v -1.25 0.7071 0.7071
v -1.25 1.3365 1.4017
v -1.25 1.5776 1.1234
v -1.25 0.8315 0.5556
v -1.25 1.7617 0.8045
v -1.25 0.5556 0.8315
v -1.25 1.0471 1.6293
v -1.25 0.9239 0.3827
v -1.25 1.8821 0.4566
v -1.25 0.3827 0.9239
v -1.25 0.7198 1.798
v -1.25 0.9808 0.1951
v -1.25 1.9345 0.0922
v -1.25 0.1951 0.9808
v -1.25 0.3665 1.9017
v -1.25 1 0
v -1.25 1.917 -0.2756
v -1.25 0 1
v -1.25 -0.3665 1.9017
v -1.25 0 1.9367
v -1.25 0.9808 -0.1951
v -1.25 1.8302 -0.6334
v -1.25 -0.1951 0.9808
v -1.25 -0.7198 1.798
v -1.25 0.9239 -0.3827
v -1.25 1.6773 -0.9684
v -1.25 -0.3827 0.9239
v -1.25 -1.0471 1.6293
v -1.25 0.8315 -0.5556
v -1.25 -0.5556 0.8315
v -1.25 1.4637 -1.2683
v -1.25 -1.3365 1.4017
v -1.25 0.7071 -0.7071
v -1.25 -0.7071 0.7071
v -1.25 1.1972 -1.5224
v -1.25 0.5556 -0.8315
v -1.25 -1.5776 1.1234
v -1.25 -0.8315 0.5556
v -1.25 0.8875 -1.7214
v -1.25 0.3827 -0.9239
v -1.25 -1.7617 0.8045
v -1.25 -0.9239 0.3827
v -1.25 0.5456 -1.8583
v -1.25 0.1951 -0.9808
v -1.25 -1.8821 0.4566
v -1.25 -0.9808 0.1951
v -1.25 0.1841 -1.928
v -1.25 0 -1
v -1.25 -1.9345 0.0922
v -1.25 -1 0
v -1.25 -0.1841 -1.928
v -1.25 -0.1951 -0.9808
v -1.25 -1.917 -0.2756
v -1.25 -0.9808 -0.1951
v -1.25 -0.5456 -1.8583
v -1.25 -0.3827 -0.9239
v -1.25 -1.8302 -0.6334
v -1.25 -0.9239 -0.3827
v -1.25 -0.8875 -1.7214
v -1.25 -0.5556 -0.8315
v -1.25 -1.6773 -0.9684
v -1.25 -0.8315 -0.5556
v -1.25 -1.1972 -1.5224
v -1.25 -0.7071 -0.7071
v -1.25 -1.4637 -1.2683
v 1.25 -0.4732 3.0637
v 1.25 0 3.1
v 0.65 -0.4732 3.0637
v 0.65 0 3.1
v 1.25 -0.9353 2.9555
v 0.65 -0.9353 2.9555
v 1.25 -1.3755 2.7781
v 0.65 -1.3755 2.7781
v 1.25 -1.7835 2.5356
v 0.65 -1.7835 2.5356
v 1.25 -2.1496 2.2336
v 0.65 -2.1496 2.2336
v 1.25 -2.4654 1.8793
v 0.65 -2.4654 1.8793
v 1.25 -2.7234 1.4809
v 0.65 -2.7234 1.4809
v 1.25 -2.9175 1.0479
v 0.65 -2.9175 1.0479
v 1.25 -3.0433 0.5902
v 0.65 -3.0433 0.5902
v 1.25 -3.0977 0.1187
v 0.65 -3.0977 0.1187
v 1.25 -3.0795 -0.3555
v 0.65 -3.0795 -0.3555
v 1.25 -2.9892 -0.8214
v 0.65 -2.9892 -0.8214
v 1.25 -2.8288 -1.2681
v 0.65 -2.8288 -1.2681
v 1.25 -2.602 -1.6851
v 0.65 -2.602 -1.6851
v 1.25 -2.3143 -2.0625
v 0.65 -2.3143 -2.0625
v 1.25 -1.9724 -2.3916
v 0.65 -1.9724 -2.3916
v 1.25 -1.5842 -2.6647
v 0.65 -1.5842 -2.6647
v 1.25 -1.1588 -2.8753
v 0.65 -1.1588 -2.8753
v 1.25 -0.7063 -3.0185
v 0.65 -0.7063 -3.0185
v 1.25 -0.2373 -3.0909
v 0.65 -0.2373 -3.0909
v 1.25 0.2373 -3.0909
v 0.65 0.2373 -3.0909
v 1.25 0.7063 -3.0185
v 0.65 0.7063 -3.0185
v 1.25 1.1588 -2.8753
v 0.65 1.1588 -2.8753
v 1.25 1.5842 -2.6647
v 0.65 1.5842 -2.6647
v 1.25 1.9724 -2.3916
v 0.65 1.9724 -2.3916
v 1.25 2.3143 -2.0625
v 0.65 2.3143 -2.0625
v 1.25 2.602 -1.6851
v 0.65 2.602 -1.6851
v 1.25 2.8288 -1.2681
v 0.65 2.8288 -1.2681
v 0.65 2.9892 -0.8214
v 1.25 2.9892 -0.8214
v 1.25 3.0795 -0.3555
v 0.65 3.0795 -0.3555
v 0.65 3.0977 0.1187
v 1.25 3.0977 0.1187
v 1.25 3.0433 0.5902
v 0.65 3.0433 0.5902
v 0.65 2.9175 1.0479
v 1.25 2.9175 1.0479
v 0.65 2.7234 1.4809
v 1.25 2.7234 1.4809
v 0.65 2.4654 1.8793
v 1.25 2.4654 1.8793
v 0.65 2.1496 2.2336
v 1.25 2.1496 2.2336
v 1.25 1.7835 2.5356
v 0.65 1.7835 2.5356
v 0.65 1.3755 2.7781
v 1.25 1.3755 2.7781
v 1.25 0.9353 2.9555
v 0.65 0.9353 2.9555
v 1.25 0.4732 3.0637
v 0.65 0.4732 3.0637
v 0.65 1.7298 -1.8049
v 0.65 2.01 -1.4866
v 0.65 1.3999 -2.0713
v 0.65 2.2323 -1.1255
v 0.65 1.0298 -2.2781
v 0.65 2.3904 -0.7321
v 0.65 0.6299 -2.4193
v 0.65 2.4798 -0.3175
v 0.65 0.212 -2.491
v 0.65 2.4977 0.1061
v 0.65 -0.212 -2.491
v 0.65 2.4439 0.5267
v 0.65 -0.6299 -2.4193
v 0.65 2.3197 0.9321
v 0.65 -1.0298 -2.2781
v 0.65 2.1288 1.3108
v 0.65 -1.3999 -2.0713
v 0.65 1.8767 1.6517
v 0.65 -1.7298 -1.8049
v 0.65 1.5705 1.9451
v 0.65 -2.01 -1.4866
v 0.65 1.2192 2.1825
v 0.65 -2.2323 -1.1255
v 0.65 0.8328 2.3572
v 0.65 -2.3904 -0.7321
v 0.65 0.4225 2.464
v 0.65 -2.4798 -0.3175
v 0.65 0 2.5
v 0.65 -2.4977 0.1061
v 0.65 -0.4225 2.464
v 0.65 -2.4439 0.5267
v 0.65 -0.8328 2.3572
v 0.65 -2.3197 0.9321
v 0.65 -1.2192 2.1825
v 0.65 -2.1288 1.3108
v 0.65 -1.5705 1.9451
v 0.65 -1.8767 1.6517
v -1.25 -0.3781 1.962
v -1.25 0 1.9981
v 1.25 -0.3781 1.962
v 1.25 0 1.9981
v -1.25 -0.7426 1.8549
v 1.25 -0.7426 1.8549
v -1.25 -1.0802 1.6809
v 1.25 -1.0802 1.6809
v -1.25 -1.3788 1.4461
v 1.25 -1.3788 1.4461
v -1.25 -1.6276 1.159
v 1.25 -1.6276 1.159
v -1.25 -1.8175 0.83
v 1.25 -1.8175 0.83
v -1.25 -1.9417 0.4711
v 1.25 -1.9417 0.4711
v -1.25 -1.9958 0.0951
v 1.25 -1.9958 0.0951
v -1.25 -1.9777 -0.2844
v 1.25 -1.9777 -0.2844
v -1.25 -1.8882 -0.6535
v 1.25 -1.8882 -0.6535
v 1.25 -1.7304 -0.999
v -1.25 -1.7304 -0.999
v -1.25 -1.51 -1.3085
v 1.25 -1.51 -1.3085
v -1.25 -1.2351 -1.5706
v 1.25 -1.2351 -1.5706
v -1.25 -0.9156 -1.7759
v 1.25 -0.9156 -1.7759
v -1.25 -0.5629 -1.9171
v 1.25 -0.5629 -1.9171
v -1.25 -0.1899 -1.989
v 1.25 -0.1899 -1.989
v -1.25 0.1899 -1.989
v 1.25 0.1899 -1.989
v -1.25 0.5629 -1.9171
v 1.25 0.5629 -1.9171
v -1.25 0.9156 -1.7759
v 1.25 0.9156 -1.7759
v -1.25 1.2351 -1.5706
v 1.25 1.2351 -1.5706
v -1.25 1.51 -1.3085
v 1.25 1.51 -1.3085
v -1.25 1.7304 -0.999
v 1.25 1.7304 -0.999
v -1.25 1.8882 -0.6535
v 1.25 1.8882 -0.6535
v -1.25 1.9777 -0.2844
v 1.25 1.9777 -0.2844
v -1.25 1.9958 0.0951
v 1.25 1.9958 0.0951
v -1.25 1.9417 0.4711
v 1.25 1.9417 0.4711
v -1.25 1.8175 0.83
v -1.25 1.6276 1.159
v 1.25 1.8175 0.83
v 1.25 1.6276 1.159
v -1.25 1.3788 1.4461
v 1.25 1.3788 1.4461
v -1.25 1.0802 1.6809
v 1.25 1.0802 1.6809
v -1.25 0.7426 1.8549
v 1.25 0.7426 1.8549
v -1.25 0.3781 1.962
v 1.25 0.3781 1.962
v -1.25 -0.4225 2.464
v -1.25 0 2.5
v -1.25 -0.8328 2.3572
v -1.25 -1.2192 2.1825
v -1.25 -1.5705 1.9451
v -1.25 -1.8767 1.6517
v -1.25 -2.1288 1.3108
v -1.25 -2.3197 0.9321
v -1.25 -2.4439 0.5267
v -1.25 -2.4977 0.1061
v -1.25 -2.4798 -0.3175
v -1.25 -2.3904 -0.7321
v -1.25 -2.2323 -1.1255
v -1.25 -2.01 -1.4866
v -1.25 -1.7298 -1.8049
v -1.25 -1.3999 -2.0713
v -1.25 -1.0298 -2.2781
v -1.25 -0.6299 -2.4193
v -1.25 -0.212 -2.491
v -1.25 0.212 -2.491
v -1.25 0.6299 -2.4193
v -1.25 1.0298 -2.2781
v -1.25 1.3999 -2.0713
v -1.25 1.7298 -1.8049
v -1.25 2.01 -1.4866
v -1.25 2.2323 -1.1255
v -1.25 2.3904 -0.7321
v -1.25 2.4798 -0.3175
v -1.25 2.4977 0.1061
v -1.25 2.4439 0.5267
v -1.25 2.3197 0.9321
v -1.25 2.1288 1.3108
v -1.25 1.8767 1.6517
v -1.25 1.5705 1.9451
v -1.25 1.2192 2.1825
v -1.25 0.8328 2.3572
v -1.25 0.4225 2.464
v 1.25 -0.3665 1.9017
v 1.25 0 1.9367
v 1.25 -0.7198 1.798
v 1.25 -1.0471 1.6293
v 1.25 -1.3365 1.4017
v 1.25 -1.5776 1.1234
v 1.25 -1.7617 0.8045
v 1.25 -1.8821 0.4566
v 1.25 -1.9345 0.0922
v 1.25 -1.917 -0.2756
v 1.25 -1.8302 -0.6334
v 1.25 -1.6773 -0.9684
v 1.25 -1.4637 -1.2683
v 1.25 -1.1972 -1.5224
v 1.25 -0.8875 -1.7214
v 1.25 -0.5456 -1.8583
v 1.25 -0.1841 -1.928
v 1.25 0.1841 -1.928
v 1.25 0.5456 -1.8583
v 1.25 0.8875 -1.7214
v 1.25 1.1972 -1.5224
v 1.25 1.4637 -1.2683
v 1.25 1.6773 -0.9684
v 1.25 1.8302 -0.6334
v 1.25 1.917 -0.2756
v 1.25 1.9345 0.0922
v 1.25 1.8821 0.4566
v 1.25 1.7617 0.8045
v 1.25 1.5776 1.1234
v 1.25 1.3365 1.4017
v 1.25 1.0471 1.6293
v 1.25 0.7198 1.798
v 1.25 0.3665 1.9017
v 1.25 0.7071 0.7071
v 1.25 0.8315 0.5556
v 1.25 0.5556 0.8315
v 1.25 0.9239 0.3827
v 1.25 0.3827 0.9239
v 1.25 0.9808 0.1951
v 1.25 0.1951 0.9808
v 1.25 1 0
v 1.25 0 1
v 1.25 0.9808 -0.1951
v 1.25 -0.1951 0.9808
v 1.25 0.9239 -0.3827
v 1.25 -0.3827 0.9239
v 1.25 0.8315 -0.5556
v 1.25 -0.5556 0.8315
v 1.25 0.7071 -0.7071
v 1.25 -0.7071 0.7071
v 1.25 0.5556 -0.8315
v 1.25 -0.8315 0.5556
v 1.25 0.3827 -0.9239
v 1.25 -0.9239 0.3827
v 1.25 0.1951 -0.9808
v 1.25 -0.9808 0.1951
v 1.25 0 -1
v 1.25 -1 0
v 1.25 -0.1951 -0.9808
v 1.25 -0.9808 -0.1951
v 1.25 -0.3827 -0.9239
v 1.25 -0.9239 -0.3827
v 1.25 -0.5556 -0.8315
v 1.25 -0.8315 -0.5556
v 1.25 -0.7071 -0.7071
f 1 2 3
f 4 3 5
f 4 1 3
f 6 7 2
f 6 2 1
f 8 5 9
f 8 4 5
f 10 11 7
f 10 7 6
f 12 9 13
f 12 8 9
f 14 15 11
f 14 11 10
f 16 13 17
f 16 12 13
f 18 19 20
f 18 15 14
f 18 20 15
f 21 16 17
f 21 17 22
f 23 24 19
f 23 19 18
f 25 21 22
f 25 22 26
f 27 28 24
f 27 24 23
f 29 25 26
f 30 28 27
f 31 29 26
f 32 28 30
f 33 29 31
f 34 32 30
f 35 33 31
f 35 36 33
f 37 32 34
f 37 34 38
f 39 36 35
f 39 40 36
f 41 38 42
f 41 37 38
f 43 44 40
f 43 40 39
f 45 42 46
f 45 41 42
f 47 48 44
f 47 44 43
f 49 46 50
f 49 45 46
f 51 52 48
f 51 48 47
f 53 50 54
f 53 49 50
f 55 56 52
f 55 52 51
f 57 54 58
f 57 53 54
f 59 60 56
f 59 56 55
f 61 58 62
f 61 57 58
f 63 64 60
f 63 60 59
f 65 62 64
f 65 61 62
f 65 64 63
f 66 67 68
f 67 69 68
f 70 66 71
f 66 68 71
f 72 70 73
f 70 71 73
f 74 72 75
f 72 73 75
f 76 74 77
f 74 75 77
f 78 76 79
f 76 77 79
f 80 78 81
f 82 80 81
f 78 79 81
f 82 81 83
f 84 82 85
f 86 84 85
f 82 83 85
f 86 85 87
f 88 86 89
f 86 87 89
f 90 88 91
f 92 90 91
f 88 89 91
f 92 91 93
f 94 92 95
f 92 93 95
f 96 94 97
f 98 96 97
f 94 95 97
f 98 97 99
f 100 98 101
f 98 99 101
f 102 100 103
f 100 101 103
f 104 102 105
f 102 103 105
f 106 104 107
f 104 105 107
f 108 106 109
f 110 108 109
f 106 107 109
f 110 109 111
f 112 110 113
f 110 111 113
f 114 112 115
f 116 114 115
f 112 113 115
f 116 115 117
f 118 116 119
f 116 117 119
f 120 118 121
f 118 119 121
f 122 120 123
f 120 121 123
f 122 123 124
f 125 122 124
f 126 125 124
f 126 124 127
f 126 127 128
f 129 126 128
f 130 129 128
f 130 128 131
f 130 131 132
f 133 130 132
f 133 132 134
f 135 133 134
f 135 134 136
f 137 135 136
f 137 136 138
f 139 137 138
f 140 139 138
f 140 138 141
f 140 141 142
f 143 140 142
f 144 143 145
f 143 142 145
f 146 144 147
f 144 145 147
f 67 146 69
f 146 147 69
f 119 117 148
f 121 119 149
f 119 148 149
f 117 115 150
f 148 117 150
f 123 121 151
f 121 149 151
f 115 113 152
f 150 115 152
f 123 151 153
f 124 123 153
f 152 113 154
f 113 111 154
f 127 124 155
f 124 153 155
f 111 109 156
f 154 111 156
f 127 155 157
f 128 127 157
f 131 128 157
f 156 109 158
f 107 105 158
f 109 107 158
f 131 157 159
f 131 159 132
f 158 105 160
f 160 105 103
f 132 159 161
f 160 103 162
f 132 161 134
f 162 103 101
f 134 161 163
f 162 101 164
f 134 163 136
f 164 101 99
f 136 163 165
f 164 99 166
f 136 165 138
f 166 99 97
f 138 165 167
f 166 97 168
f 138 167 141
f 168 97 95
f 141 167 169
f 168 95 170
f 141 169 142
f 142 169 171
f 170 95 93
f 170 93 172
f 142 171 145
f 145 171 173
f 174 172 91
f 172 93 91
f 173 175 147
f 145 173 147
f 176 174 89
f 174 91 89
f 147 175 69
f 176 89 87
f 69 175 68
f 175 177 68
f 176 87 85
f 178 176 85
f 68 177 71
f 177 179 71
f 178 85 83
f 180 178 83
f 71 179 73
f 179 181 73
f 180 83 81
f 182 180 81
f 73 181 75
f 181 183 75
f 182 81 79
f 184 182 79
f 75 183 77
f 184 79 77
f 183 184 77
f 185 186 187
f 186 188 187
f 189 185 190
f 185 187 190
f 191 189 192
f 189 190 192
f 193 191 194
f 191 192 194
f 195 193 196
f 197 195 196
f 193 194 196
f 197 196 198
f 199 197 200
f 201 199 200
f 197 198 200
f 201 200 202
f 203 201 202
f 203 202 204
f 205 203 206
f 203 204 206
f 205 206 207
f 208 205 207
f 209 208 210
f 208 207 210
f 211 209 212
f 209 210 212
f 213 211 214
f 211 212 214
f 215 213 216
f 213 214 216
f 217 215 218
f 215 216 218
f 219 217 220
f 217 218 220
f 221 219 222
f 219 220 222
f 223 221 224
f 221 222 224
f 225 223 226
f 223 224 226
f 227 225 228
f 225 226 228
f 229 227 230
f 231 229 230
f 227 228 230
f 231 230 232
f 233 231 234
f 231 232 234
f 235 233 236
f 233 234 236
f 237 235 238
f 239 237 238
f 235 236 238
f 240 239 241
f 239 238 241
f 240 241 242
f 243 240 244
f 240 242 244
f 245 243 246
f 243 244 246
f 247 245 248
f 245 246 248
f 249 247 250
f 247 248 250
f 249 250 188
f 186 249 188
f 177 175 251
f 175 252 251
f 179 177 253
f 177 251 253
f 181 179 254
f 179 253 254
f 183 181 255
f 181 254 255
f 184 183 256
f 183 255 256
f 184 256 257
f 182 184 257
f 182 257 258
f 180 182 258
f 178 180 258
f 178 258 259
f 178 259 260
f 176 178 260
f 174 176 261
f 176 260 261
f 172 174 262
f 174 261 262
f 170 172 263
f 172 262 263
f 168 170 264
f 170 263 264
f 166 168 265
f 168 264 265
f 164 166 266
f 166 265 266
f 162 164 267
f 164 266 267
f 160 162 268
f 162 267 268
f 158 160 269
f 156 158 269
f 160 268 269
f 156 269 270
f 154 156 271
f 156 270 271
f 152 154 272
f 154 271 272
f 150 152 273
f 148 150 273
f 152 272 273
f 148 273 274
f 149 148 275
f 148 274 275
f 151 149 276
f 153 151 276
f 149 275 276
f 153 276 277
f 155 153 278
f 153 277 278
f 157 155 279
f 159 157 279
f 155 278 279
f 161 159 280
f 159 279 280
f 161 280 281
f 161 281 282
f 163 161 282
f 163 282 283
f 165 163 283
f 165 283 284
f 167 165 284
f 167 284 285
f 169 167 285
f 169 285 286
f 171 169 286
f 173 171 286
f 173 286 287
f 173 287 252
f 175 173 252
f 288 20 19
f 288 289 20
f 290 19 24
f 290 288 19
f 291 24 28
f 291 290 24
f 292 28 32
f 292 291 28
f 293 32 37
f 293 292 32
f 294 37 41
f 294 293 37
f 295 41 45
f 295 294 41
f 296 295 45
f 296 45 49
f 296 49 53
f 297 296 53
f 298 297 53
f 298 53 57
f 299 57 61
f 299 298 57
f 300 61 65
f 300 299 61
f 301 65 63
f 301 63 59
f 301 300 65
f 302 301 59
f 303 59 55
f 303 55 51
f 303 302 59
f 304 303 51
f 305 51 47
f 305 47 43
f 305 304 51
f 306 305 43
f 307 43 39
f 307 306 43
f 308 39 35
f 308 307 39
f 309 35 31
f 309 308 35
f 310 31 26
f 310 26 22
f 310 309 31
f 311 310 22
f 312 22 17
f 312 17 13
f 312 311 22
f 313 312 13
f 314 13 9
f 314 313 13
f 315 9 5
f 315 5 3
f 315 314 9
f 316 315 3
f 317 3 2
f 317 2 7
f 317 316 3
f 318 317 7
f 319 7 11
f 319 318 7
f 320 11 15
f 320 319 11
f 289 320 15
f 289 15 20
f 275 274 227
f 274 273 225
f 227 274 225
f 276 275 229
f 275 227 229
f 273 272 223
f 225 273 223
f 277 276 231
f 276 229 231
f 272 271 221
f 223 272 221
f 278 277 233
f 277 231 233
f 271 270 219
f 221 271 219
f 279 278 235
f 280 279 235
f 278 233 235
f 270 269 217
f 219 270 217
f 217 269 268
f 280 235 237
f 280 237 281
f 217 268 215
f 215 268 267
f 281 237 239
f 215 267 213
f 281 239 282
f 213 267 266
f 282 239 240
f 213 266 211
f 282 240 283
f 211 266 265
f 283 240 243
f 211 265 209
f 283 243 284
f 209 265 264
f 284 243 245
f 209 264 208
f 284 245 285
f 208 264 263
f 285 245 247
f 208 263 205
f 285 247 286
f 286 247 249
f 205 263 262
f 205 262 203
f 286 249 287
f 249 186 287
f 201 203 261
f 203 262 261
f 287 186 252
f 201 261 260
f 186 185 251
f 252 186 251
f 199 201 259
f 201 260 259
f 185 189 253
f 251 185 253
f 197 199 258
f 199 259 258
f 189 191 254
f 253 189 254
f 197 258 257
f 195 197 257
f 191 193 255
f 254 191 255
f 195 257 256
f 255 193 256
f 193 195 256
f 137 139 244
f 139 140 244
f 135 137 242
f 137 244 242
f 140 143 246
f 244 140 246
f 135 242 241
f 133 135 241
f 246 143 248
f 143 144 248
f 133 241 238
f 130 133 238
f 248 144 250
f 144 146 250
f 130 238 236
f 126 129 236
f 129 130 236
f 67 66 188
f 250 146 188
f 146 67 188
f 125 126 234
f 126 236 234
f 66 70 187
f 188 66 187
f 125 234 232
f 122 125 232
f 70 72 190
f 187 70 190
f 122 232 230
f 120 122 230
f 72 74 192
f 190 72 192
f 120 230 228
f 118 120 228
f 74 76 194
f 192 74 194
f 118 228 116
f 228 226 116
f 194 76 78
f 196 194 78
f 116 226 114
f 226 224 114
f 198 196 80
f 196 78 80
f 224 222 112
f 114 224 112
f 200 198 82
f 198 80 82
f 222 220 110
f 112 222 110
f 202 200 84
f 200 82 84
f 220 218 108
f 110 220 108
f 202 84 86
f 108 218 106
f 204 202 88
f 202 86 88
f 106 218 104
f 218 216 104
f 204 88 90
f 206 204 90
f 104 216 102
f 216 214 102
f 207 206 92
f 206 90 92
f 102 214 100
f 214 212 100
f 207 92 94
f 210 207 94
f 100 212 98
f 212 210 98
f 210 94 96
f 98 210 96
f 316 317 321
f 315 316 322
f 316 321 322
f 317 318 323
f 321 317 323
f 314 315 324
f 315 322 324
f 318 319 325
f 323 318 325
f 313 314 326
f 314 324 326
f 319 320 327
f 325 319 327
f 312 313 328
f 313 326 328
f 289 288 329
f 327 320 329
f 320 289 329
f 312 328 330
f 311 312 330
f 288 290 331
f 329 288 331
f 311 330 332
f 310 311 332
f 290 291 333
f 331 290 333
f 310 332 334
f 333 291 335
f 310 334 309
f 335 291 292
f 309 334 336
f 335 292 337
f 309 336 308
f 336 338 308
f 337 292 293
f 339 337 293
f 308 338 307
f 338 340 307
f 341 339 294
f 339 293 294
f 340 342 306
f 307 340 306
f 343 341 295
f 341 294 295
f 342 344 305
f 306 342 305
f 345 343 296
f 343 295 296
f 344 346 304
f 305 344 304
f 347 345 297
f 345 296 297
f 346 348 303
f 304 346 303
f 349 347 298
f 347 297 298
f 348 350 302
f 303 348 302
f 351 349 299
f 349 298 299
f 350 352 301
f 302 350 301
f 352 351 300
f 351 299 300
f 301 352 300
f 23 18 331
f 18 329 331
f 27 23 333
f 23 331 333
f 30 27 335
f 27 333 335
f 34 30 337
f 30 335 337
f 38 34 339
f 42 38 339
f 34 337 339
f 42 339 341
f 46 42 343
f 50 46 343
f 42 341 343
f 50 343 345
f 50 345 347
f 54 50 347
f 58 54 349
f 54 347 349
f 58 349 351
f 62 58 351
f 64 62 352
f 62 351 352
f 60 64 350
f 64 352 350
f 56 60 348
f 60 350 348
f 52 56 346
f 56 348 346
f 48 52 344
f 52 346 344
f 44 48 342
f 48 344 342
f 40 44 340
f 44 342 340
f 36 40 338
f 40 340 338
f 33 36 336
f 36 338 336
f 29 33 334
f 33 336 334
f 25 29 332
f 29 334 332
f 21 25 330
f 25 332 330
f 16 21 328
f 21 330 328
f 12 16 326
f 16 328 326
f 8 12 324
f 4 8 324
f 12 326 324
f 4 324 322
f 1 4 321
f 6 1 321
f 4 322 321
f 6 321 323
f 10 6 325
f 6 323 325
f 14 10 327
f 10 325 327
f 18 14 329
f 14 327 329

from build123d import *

# Parameters (mm, degrees)
F0_W = 2.5
F0_H = 0.936731


with BuildPart() as f1:
    # F0 (on Front) → F1 (revolve)
    with BuildSketch(Plane.XZ):
        Polygon((0.65, 2.5), (-1.25, 2.5), (-1.25, 1.998061), (1.25, 1.998061), (1.25, 3.1), (0.65, 3.1), align=None)
    revolve(axis=Axis((0, 0, 0), (1, 0, 0)))


with BuildPart() as f2:
    # F0 (on Front) → F2 (revolve)
    with BuildSketch(Plane.XZ):
        with Locations((0, 1.468365)):
            Rectangle(F0_W, F0_H)
    revolve(axis=Axis((0, 0, 0), (1, 0, 0)))


solid = Compound([f1.part, f2.part])
